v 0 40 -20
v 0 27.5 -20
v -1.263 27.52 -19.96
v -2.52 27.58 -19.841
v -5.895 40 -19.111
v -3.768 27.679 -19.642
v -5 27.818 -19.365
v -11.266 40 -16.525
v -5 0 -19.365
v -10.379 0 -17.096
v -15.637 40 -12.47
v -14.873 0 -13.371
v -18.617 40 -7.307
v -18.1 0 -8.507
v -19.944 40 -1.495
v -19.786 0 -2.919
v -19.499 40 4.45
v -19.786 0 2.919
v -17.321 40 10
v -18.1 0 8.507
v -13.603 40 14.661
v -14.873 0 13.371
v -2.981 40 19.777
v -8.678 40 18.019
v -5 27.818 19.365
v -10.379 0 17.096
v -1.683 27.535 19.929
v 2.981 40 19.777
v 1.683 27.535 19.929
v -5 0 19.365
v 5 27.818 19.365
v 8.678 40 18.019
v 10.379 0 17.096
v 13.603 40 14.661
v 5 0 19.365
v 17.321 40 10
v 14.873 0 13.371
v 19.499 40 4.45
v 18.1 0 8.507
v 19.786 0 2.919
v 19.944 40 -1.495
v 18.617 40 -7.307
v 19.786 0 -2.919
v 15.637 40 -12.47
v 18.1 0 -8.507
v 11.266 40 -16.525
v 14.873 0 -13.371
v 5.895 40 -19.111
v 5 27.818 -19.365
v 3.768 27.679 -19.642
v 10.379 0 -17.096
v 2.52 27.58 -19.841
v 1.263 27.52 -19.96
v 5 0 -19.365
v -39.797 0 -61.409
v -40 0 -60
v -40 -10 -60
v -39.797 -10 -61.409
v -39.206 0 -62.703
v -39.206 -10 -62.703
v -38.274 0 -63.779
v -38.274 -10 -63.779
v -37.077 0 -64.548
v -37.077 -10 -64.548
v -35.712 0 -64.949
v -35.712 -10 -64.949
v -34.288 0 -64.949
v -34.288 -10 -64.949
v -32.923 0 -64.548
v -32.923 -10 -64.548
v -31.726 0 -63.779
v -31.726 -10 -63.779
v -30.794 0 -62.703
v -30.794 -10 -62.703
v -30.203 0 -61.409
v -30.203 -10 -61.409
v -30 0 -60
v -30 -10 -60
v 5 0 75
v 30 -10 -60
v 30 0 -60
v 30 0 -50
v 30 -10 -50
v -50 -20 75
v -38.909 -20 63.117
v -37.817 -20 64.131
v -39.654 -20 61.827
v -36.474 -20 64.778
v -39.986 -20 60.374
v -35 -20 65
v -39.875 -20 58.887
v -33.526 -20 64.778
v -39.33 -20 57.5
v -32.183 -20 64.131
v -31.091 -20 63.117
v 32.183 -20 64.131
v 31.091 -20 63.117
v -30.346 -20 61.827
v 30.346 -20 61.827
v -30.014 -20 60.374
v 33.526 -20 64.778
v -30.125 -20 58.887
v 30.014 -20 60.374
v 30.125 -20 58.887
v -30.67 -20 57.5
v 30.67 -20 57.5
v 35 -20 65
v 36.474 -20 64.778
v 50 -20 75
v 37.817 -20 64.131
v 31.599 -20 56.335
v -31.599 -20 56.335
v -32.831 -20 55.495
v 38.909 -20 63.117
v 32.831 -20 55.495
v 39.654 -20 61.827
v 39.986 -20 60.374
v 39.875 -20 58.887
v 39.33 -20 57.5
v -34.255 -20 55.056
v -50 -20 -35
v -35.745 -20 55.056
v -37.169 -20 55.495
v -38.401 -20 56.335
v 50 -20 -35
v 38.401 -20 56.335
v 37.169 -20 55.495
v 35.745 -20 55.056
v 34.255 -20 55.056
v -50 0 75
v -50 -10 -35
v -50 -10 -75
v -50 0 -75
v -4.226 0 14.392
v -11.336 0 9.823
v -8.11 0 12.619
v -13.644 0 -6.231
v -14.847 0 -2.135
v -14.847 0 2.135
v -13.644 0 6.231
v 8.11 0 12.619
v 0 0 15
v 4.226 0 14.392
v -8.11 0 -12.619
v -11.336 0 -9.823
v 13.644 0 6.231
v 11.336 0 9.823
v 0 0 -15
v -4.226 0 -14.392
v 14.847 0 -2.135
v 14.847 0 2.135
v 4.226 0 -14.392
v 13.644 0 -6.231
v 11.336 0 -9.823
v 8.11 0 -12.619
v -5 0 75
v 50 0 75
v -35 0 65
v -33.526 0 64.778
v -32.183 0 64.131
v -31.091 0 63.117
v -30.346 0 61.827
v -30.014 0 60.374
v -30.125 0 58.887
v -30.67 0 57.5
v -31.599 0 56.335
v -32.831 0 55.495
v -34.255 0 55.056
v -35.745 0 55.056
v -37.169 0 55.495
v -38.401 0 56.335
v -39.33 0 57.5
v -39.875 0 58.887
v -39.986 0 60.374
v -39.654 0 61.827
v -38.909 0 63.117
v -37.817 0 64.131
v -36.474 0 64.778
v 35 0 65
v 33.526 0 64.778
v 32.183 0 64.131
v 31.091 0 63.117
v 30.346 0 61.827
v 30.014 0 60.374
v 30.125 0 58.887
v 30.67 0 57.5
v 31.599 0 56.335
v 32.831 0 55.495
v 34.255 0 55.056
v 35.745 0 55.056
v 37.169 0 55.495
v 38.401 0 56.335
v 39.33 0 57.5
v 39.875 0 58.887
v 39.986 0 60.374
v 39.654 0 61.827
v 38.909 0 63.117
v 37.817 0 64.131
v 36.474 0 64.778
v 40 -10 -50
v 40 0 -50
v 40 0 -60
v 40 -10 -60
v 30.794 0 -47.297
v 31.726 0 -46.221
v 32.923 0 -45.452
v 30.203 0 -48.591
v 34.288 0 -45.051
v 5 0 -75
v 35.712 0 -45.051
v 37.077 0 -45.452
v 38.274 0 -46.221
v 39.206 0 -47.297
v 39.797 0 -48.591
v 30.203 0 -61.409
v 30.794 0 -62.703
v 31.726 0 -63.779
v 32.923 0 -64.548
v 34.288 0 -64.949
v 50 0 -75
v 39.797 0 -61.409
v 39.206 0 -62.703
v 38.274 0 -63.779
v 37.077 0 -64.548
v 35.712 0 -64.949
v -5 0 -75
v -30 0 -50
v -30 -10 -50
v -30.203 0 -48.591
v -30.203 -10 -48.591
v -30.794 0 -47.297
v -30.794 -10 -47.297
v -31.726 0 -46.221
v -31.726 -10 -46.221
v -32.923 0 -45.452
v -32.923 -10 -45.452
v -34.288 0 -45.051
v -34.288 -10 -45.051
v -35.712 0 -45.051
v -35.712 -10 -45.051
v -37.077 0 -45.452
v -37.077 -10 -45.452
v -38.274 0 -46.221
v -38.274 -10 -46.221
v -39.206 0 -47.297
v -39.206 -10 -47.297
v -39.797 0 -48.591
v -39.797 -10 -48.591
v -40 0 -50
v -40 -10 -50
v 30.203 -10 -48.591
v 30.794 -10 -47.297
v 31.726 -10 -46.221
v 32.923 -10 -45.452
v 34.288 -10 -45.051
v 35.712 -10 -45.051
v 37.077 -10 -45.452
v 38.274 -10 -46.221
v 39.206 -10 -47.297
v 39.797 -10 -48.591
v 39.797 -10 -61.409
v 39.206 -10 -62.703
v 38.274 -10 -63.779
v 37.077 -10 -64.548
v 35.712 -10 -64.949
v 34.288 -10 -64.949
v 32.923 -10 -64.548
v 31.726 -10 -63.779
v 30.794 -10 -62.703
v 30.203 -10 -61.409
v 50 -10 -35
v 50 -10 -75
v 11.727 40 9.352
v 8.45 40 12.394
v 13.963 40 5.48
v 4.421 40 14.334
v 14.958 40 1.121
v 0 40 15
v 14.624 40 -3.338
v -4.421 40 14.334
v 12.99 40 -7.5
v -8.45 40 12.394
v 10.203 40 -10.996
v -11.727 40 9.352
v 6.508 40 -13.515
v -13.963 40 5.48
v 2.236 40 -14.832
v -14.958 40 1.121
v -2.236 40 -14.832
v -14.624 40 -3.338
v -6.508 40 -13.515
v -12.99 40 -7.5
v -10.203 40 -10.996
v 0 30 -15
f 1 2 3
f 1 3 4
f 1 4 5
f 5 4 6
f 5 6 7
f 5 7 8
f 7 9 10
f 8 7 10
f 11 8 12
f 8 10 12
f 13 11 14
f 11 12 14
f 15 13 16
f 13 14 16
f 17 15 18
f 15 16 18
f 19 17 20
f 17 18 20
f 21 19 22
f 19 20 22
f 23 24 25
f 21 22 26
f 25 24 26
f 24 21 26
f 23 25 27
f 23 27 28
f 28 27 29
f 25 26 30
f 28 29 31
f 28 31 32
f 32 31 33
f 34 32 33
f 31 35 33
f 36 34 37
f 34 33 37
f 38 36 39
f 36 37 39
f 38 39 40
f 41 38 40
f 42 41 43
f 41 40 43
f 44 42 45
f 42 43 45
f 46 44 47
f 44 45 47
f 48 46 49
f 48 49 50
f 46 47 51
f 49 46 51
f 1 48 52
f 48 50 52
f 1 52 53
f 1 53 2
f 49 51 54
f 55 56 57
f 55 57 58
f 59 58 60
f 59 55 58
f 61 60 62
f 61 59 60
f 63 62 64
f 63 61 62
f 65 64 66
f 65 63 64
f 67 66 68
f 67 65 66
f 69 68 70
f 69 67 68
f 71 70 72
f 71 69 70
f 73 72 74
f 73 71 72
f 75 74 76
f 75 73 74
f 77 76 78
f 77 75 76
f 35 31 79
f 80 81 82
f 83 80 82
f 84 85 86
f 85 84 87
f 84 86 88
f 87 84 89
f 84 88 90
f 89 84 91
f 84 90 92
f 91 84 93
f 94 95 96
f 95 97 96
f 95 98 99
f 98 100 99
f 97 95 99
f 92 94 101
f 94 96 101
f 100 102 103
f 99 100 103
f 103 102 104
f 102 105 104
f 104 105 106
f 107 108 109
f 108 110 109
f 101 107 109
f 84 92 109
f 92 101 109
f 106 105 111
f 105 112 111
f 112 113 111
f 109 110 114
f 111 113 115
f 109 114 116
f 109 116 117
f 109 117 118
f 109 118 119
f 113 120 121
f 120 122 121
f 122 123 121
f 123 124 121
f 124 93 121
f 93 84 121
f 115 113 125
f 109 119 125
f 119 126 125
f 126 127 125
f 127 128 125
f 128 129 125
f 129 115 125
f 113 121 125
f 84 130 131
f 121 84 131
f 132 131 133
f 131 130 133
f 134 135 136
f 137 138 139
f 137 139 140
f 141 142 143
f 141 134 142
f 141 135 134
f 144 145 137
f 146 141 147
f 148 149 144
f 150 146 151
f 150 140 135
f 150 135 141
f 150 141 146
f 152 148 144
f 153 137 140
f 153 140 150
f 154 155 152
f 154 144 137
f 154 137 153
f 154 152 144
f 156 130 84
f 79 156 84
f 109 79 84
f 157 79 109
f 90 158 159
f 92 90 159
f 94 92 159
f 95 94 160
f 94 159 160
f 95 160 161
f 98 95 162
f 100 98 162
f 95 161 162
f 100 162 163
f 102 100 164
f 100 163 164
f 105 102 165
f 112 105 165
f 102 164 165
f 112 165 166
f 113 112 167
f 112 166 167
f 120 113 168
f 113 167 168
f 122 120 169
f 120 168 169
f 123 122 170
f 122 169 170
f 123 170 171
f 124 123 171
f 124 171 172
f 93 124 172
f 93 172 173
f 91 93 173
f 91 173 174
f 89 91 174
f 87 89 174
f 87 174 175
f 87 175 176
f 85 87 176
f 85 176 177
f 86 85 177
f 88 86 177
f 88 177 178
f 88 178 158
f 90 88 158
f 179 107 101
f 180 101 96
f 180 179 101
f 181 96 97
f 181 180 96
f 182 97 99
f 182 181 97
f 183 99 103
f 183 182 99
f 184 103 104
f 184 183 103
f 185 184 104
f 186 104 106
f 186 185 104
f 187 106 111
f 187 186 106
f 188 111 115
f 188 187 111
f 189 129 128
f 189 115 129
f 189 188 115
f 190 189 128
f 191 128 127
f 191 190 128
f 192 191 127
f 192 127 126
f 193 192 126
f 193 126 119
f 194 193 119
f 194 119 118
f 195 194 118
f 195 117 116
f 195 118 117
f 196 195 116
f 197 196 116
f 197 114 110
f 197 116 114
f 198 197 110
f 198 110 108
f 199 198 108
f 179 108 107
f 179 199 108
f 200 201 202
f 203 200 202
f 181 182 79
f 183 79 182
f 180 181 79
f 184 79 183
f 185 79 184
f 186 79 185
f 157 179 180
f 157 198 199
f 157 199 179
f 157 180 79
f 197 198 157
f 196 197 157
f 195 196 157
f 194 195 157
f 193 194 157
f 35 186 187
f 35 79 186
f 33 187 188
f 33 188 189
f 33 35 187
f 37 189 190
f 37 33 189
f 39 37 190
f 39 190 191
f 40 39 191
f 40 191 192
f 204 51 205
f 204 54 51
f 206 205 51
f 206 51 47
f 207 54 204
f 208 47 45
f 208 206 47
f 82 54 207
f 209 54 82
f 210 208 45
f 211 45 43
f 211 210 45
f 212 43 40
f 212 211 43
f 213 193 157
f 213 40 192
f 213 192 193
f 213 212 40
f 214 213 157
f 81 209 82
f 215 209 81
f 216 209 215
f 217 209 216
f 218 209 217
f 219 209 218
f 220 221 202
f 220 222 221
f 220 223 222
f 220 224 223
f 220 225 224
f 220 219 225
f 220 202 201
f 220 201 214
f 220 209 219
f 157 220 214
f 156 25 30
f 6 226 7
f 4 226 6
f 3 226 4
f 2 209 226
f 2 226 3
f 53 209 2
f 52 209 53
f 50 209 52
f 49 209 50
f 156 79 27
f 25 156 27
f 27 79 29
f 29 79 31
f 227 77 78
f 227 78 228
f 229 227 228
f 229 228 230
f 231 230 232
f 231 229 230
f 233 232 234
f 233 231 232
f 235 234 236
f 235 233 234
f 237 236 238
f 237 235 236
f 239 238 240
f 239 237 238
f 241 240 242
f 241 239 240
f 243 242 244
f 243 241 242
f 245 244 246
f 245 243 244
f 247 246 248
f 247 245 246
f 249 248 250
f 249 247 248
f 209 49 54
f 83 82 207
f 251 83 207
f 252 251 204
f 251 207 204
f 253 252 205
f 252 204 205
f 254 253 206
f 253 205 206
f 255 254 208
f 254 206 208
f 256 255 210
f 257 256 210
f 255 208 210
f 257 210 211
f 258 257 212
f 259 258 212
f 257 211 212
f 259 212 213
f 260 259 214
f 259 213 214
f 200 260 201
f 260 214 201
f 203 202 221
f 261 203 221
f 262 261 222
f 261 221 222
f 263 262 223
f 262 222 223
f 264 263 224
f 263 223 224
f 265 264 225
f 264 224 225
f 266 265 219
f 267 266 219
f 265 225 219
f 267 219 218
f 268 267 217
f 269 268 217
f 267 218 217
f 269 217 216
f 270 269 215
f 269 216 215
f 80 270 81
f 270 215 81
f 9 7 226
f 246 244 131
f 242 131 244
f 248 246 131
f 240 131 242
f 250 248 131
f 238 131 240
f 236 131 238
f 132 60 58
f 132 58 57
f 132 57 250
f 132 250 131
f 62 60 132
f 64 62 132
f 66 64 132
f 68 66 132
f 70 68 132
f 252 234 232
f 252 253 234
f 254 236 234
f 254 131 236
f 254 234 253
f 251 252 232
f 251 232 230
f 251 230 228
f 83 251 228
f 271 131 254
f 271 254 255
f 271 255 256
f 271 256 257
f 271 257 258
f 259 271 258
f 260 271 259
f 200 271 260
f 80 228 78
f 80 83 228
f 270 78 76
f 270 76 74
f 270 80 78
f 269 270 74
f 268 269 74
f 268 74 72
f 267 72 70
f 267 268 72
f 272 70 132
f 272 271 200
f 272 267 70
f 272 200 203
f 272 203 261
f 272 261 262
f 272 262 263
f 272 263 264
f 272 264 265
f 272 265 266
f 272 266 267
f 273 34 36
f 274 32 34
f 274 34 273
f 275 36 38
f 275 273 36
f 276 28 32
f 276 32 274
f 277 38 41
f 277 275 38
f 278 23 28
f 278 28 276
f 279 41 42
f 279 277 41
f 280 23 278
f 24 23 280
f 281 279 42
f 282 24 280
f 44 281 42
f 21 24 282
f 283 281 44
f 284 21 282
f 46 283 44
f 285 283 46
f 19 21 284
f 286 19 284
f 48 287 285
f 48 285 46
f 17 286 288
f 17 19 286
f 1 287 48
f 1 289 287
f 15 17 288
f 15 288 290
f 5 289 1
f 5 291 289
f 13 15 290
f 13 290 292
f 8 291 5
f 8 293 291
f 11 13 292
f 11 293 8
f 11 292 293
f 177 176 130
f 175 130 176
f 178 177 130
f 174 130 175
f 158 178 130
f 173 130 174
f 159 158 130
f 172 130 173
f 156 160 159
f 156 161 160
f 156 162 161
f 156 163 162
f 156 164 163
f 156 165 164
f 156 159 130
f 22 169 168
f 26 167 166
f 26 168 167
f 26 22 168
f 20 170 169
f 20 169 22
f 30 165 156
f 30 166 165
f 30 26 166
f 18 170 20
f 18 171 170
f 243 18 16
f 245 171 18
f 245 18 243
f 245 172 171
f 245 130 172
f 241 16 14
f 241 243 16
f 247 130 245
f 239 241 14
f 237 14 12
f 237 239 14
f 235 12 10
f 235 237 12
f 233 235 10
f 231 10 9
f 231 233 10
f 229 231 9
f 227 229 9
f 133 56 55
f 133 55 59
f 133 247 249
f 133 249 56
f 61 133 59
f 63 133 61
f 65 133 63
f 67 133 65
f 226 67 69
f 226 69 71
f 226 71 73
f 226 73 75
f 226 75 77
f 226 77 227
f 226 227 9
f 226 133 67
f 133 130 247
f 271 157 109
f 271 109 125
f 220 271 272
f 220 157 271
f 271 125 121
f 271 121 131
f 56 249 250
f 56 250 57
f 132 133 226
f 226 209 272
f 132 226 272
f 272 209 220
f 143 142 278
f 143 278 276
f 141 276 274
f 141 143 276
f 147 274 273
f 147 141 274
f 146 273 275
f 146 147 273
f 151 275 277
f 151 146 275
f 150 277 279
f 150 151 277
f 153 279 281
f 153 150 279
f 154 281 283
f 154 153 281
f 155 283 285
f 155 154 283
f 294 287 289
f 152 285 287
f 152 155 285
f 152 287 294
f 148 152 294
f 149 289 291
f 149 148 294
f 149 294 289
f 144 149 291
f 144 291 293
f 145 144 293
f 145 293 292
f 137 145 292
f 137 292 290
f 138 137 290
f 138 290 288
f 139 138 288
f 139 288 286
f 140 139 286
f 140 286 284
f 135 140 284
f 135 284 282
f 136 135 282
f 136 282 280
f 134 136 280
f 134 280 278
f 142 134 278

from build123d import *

# Parameters (mm, degrees)
SKETCH_2_W          = 100
SKETCH_2_H          = 150
EXTRUDE_2_DEPTH     = 20
SKETCH_3_W          = 40
SKETCH_3_H          = 10
CUT_EXTRUDE_1_DEPTH = 127.589889012
SKETCH_5_R          = 5
CUT_EXTRUDE_3_DEPTH = 93.330926563
SKETCH_6_R          = 20
SKETCH_6_R_2        = 15
EXTRUDE_6_DEPTH     = 40
EXTRUDE_9_DEPTH     = 5
CUT_EXTRUDE_2_DEPTH = 99.615414617


with BuildPart() as part:
    # Эскиз2 → Бобышка-Вытянуть2 (new body)
    with BuildSketch(Plane(origin=(0, 0, 0), x_dir=(1, 0, 0), z_dir=(0, 1, 0))):
        Rectangle(SKETCH_2_W, SKETCH_2_H)
    extrude(amount=-EXTRUDE_2_DEPTH)

    # Эскиз3 → Вырез-Вытянуть1 (cut, through all)
    with BuildSketch(Plane(origin=(50, 0, 0), x_dir=(0, 0, -1), z_dir=(1, 0, 0))):
        with Locations((55, -15)):
            Rectangle(SKETCH_3_W, SKETCH_3_H)
    extrude(amount=-CUT_EXTRUDE_1_DEPTH, mode=Mode.SUBTRACT)

    # Эскиз5 → Вырез-Вытянуть3 (cut, through all)
    with BuildSketch(Plane(origin=(0, 0, 0), x_dir=(1, 0, 0), z_dir=(0, 1, 0))):
        with Locations(Location((-35, -60, 0), (0, 0, 270))):
            Circle(SKETCH_5_R)
        with BuildLine():
            Line((-30, 60), (-30, 50))
            ThreePointArc((-30, 50), (-35, 45), (-40, 50))
            Line((-40, 50), (-40, 60))
            ThreePointArc((-40, 60), (-35, 65), (-30, 60))
        make_face()
    cut_extrude_3 = extrude(amount=-CUT_EXTRUDE_3_DEPTH, mode=Mode.SUBTRACT)

    # Зеркальное отражение2: Вырез-Вытянуть3 across plane
    add(cut_extrude_3.mirror(Plane(origin=(0, 0, 0), x_dir=(0, 0, 1), z_dir=(1, 0, 0))), mode=Mode.SUBTRACT)

    # Эскиз6 → Бобышка-Вытянуть6 (add)
    with BuildSketch(Plane(origin=(0, 0, 0), x_dir=(1, 0, 0), z_dir=(0, 1, 0))):
        with Locations(Location((0, 0, 0), (0, 0, 90))):
            Circle(SKETCH_6_R)
        with Locations(Location((0, 0, 0), (0, 0, 270))):
            Circle(SKETCH_6_R_2, mode=Mode.SUBTRACT)
    extrude(amount=EXTRUDE_6_DEPTH)

    # Эскиз7 → Бобышка-Вытянуть9 (add, symmetric)
    with BuildSketch(Plane(origin=(0, 0, 0), x_dir=(0, 0, -1), z_dir=(1, 0, 0))):
        Polygon((-75, 0), (-15, 30), (-15, 0), align=None)
    extrude_9 = extrude(amount=EXTRUDE_9_DEPTH, both=True)

    # Зеркальное отражение3: Бобышка-Вытянуть9 across plane
    add(extrude_9.mirror(Plane.XY))

    # Эскиз4 → Вырез-Вытянуть2 (cut, through all)
    with BuildSketch(Plane(origin=(0, 0, 0), x_dir=(1, 0, 0), z_dir=(0, 1, 0))):
        with BuildLine():
            Line((-30, 60), (-30, 50))
            ThreePointArc((-30, 50), (-35, 45), (-40, 50))
            Line((-40, 50), (-40, 60))
            ThreePointArc((-40, 60), (-35, 65), (-30, 60))
        make_face()
    extrude(amount=-CUT_EXTRUDE_2_DEPTH, mode=Mode.SUBTRACT)


solid = part.part
